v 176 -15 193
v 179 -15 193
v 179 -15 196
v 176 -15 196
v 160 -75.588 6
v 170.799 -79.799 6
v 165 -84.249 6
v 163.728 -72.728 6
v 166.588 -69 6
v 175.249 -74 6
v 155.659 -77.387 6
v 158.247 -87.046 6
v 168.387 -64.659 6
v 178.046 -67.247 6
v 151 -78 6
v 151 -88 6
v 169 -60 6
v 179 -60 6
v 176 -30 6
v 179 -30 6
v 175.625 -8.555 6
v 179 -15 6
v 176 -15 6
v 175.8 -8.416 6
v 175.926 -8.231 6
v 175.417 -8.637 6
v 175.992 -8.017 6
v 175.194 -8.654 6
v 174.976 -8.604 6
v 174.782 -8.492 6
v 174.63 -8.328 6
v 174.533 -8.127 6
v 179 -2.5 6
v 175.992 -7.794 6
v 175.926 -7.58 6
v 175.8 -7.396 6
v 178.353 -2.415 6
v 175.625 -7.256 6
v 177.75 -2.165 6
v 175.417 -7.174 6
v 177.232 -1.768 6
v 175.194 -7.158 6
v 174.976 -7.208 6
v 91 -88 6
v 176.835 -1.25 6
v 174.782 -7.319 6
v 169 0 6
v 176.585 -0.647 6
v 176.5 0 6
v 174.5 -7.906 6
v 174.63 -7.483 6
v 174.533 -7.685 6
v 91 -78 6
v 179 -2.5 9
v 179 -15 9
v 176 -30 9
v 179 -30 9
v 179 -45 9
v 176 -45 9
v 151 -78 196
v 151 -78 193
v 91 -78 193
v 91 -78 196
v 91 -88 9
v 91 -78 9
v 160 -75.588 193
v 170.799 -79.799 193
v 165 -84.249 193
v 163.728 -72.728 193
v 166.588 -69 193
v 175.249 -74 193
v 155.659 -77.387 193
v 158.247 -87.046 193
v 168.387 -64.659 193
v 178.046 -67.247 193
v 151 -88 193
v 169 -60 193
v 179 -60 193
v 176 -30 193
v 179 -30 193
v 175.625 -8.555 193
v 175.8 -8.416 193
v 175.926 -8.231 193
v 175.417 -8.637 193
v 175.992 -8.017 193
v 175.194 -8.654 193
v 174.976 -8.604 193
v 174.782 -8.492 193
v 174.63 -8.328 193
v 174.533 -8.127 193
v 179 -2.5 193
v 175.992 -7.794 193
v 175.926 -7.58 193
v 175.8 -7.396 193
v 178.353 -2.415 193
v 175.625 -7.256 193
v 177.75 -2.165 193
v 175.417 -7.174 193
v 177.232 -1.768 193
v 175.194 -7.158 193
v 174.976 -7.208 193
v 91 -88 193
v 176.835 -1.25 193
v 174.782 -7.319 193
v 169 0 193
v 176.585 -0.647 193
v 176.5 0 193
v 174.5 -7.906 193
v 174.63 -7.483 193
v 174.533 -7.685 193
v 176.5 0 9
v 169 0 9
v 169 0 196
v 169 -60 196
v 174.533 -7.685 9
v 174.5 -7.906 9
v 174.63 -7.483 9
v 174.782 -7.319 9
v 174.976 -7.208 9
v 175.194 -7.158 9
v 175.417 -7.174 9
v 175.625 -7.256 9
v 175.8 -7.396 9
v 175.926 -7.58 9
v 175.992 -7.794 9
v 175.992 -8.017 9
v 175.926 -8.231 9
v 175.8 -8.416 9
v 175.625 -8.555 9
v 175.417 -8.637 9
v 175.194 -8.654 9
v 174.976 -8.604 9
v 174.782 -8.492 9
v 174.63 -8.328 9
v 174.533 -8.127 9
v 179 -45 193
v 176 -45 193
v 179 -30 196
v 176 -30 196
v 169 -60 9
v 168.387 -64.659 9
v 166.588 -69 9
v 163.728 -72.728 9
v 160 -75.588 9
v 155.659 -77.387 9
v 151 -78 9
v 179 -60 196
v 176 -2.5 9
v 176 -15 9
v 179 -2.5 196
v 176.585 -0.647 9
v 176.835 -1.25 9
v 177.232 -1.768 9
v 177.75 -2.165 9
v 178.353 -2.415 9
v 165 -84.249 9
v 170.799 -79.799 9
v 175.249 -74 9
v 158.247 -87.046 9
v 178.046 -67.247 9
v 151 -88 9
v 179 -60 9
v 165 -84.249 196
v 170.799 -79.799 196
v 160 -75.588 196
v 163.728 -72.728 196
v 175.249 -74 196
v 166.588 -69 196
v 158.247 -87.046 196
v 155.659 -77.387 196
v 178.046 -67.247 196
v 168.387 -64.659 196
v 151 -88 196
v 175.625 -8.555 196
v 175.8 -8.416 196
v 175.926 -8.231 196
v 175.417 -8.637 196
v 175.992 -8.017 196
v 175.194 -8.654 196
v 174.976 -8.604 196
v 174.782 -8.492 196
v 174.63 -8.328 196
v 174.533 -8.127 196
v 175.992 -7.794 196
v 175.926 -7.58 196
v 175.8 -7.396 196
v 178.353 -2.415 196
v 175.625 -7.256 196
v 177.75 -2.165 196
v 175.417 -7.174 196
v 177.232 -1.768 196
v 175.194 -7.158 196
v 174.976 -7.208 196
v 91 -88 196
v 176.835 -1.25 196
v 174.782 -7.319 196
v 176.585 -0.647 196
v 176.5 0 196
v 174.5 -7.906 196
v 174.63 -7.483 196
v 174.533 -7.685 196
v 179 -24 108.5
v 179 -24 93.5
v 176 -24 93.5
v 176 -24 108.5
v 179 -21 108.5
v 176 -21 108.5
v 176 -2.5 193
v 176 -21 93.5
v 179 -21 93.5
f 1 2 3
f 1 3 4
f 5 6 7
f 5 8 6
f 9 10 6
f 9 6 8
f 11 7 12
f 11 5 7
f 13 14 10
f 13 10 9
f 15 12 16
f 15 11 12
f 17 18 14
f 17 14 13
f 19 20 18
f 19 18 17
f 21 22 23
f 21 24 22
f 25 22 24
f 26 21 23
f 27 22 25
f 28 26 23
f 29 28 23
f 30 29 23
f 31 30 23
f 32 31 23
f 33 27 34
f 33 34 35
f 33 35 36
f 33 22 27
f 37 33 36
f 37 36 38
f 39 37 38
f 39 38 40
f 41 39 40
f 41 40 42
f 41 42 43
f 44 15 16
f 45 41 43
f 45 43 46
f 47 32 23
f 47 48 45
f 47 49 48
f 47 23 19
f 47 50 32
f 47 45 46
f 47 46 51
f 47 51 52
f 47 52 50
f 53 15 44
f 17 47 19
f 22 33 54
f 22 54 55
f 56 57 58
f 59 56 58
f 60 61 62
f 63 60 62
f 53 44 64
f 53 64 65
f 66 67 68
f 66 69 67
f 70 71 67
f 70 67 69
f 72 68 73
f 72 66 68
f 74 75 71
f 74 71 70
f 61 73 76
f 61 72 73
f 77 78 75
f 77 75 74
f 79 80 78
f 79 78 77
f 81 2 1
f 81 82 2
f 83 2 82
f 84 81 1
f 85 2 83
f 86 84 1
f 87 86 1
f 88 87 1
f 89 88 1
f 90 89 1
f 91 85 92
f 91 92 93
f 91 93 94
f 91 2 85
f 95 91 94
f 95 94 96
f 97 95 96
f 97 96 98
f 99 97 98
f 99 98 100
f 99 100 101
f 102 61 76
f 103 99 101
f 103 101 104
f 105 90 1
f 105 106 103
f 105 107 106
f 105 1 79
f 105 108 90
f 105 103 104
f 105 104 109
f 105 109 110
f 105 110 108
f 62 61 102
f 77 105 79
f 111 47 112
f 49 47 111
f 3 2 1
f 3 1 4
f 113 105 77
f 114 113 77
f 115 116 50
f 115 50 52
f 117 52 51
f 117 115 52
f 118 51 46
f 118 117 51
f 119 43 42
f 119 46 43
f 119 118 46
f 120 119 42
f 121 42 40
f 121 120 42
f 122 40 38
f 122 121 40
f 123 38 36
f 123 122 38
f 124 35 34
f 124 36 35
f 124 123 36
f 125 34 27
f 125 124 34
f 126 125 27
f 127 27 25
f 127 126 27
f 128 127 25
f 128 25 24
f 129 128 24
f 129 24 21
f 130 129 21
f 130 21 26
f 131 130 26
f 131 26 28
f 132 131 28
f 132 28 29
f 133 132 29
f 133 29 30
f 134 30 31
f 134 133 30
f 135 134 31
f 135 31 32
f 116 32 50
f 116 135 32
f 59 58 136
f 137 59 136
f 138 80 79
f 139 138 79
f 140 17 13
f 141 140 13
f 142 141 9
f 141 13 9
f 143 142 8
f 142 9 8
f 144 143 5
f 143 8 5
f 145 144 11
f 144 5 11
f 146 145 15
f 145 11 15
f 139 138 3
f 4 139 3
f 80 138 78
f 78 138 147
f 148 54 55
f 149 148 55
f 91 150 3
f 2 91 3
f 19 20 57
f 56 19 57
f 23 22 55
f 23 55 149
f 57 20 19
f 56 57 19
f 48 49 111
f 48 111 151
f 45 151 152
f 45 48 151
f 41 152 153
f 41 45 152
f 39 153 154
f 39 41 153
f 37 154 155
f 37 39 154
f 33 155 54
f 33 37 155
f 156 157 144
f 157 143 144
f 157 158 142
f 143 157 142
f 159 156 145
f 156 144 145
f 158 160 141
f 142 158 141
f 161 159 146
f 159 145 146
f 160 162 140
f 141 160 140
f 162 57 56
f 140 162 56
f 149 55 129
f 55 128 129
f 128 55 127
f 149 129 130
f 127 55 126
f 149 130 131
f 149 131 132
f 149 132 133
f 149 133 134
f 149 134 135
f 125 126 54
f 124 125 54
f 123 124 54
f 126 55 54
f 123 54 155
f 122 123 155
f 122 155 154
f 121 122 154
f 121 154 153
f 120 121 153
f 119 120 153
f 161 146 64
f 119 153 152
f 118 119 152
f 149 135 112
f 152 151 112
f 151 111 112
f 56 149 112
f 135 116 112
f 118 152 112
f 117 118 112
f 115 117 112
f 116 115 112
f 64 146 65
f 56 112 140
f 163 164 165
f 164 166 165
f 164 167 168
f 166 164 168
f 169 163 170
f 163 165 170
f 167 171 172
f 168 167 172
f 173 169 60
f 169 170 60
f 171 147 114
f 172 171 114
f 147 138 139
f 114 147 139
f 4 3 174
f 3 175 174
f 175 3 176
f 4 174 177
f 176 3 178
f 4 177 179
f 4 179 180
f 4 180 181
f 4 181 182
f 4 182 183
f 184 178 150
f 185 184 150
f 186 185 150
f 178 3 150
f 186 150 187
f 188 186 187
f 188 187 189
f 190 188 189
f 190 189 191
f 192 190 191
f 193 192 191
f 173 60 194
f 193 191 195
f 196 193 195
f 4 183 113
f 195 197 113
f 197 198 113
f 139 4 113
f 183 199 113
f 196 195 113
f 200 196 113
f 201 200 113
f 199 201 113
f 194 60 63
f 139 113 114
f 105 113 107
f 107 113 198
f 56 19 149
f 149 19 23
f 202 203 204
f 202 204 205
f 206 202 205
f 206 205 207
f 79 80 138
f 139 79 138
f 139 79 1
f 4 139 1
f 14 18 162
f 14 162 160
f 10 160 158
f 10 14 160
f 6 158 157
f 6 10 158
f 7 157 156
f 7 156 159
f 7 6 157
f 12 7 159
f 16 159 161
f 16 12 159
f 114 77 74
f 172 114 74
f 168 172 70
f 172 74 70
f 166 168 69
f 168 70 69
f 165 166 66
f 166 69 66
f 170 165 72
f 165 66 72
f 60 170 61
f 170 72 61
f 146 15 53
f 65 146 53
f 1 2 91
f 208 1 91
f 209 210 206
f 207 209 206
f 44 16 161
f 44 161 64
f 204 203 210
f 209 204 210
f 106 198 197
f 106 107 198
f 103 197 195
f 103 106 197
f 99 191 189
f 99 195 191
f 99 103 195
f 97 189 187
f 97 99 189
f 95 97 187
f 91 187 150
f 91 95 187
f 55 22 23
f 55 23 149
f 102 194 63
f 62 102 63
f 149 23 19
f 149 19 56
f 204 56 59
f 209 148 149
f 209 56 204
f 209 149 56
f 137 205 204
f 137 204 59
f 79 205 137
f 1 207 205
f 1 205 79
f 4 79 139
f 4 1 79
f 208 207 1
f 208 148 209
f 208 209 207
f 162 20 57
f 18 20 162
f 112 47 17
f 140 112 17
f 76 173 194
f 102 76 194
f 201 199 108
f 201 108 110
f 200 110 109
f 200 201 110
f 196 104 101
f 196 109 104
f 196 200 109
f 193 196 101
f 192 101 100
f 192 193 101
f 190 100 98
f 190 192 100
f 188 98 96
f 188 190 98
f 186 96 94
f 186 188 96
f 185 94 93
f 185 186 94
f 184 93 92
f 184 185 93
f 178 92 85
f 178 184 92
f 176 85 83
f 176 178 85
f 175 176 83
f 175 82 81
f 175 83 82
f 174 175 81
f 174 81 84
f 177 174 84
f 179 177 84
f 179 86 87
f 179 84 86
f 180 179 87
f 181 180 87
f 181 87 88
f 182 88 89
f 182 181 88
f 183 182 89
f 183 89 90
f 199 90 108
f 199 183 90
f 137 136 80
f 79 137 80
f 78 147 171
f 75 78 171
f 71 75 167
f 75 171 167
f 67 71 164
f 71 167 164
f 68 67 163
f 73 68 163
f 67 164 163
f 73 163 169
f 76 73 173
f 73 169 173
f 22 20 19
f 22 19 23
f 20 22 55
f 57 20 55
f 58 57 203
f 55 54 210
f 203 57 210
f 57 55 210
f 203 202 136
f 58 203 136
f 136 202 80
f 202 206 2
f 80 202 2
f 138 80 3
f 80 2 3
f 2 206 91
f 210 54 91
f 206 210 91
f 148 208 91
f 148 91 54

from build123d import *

# Parameters (mm, degrees)
BOSS_EXTRUDE1_DEPTH     = 3
BOSS_EXTRUDE2_START     = -190
BOSS_EXTRUDE2_DEPTH     = 3
CUT_EXTRUDE1_DEPTH      = 229.309001137
CUT_EXTRUDE1_DEPTH_BACK = 229.309001137
SKETCH2_W               = 3
SKETCH2_H               = 15
SKETCH3_W               = 3
SKETCH3_H               = 15
BOSS_EXTRUDE3_DEPTH     = 3
CUT_EXTRUDE2_DEPTH      = 276.472321659
CUT_EXTRUDE2_DEPTH_BACK = 276.472321659
SKETCH6_R               = 2.5
CUT_EXTRUDE3_DEPTH      = 233.172349775
CUT_EXTRUDE3_DEPTH_BACK = 233.172349775
SKETCH7_W               = 184
SKETCH7_H               = 2.5
CUT_EXTRUDE4_DEPTH      = 232.051942212
CUT_EXTRUDE4_DEPTH_BACK = 232.051942212
SKETCH8_W               = 15
SKETCH8_H               = 3
CUT_EXTRUDE6_DEPTH      = 276.472321659
CUT_EXTRUDE6_DEPTH_BACK = 276.472321659
CUT_EXTRUDE7_DEPTH      = 276.472321659
CUT_EXTRUDE7_DEPTH_BACK = 276.472321659
SKETCH12_R              = 0.75


with BuildPart() as part:
    # Sketch1 → Boss-Extrude1 (new body)
    with BuildSketch(Plane.XY.offset(196)):
        with BuildLine():
            Line((91, -68), (31, -68))
            ThreePointArc((31, -68), (25.343145751, -65.656854249), (23, -60))
            Line((23, -60), (23, 0))
            Line((23, 0), (3, 0))
            Line((3, 0), (3, -60))
            ThreePointArc((3, -60), (11.201010127, -79.798989873), (31, -88))
            Line((31, -88), (91, -88))
            Line((91, -88), (91, -68))
        make_face()
    extrude(amount=-BOSS_EXTRUDE1_DEPTH)


with BuildPart() as body_2:
    # Sketch1<2> → Boss-Extrude2 (new body)
    with BuildSketch(Plane.XY.offset(196).offset(BOSS_EXTRUDE2_START)):
        with BuildLine():
            Line((91, -68), (31, -68))
            ThreePointArc((31, -68), (25.343145751, -65.656854249), (23, -60))
            Line((23, -60), (23, 0))
            Line((23, 0), (3, 0))
            Line((3, 0), (3, -60))
            ThreePointArc((3, -60), (11.201010127, -79.798989873), (31, -88))
            Line((31, -88), (91, -88))
            Line((91, -88), (91, -68))
        make_face()
    extrude(amount=BOSS_EXTRUDE2_DEPTH)


with BuildPart() as cut_extrude1_tool:
    # Sketch2 → Cut-Extrude1 (new, two sides: drawn at the far end of the back side and taken through both)
    with BuildSketch(Plane.XY.offset(196).offset(-CUT_EXTRUDE1_DEPTH_BACK)):
        with Locations((4.5, -22.5)):
            Rectangle(SKETCH2_W, SKETCH2_H)
    extrude(amount=CUT_EXTRUDE1_DEPTH + CUT_EXTRUDE1_DEPTH_BACK)


with BuildPart() as part_1:
    add(part.part)

    # Cut-Extrude1: cut by cut_extrude1_tool
    add(cut_extrude1_tool.part, mode=Mode.SUBTRACT)


with BuildPart() as body_2_1:
    add(body_2.part)

    # Cut-Extrude1: cut by cut_extrude1_tool
    add(cut_extrude1_tool.part, mode=Mode.SUBTRACT)


with BuildPart() as body_3:
    # Sketch3 → Boss-Extrude3 (new body)
    with BuildSketch(Plane.ZY.offset(-3)):
        Polygon((193, 0), (9, 0), (9, -45), (193, -45), (193, -30), (193, -15), align=None)
        with Locations((7.5, -22.5)):
            Rectangle(SKETCH3_W, SKETCH3_H)
        with Locations((194.5, -22.5)):
            Rectangle(SKETCH3_W, SKETCH3_H)
    extrude(amount=-BOSS_EXTRUDE3_DEPTH)


with BuildPart() as body_4:
    # Mirror1: mirrored copy
    add(body_3.part.mirror(Plane(origin=(91, -88, 193), x_dir=(0, 0, 1), z_dir=(1, 0, 0))))


with BuildPart() as body_5:
    # Mirror1 2: mirrored copy
    add(part_1.part.mirror(Plane(origin=(91, -88, 193), x_dir=(0, 0, 1), z_dir=(1, 0, 0))))


with BuildPart() as body_6:
    # Mirror1 3: mirrored copy
    add(body_2_1.part.mirror(Plane(origin=(91, -88, 193), x_dir=(0, 0, 1), z_dir=(1, 0, 0))))


with BuildPart() as cut_extrude2_tool:
    # Sketch6 → Cut-Extrude2 (new, two sides: drawn at the far end of the back side and taken through both)
    with BuildSketch(Plane.XY.offset(196).offset(-CUT_EXTRUDE2_DEPTH_BACK)):
        with Locations((179, 0)):
            Circle(SKETCH6_R)
    extrude(amount=CUT_EXTRUDE2_DEPTH + CUT_EXTRUDE2_DEPTH_BACK)


with BuildPart() as body_4_1:
    add(body_4.part)

    # Cut-Extrude2: cut by cut_extrude2_tool
    add(cut_extrude2_tool.part, mode=Mode.SUBTRACT)

    # Sketch7 → Cut-Extrude3 (cut, two sides: drawn at the far end of the back side and taken through both)
    with BuildSketch(Plane(origin=(179, 0, 0), x_dir=(0, 0, -1), z_dir=(1, 0, 0)).offset(-CUT_EXTRUDE3_DEPTH_BACK)):
        with Locations((-101, -1.25)):
            Rectangle(SKETCH7_W, SKETCH7_H)
    extrude(amount=CUT_EXTRUDE3_DEPTH + CUT_EXTRUDE3_DEPTH_BACK, mode=Mode.SUBTRACT)

    # Sketch8 → Cut-Extrude4 (cut, two sides: drawn at the far end of the back side and taken through both)
    with BuildSketch(Plane.ZY.offset(-176).offset(-CUT_EXTRUDE4_DEPTH_BACK)):
        with Locations((101, -22.5)):
            Rectangle(SKETCH8_W, SKETCH8_H)
    extrude(amount=CUT_EXTRUDE4_DEPTH + CUT_EXTRUDE4_DEPTH_BACK, mode=Mode.SUBTRACT)


with BuildPart() as body_5_1:
    add(body_5.part)

    # Cut-Extrude2: cut by cut_extrude2_tool
    add(cut_extrude2_tool.part, mode=Mode.SUBTRACT)


with BuildPart() as body_6_1:
    add(body_6.part)

    # Cut-Extrude2: cut by cut_extrude2_tool
    add(cut_extrude2_tool.part, mode=Mode.SUBTRACT)


with BuildPart() as cut_extrude6_tool:
    # Sketch11 → Cut-Extrude6 (new, two sides: drawn at the far end of the back side and taken through both)
    with BuildSketch(Plane.XY.offset(196).offset(-CUT_EXTRUDE6_DEPTH_BACK)):
        with BuildLine():
            Line((91, -68), (151, -68))
            ThreePointArc((151, -68), (156.656854249, -65.656854249), (159, -60))
            Line((159, -60), (159, 0))
            Line((159, 0), (169, 0))
            Line((169, 0), (169, -60))
            ThreePointArc((169, -60), (163.727922061, -72.727922061), (151, -78))
            Line((151, -78), (91, -78))
            Line((91, -78), (91, -68))
        make_face()
    extrude(amount=CUT_EXTRUDE6_DEPTH + CUT_EXTRUDE6_DEPTH_BACK)


with BuildPart() as body_5_2:
    add(body_5_1.part)

    # Cut-Extrude6: cut by cut_extrude6_tool
    add(cut_extrude6_tool.part, mode=Mode.SUBTRACT)


with BuildPart() as body_6_2:
    add(body_6_1.part)

    # Cut-Extrude6: cut by cut_extrude6_tool
    add(cut_extrude6_tool.part, mode=Mode.SUBTRACT)


with BuildPart() as cut_extrude7_tool:
    # Sketch12 → Cut-Extrude7 (new, two sides: drawn at the far end of the back side and taken through both)
    with BuildSketch(Plane(origin=(0, 0, 6), x_dir=(-1, 0, 0), z_dir=(0, 0, -1)).offset(-CUT_EXTRUDE7_DEPTH_BACK)):
        with Locations((-175.25, -7.90569415)):
            Circle(SKETCH12_R)
    extrude(amount=CUT_EXTRUDE7_DEPTH + CUT_EXTRUDE7_DEPTH_BACK)


with BuildPart() as body_5_3:
    add(body_5_2.part)

    # Cut-Extrude7: cut by cut_extrude7_tool
    add(cut_extrude7_tool.part, mode=Mode.SUBTRACT)


with BuildPart() as body_6_3:
    add(body_6_2.part)

    # Cut-Extrude7: cut by cut_extrude7_tool
    add(cut_extrude7_tool.part, mode=Mode.SUBTRACT)


solid = Compound([body_4_1.part, body_5_3.part, body_6_3.part])
